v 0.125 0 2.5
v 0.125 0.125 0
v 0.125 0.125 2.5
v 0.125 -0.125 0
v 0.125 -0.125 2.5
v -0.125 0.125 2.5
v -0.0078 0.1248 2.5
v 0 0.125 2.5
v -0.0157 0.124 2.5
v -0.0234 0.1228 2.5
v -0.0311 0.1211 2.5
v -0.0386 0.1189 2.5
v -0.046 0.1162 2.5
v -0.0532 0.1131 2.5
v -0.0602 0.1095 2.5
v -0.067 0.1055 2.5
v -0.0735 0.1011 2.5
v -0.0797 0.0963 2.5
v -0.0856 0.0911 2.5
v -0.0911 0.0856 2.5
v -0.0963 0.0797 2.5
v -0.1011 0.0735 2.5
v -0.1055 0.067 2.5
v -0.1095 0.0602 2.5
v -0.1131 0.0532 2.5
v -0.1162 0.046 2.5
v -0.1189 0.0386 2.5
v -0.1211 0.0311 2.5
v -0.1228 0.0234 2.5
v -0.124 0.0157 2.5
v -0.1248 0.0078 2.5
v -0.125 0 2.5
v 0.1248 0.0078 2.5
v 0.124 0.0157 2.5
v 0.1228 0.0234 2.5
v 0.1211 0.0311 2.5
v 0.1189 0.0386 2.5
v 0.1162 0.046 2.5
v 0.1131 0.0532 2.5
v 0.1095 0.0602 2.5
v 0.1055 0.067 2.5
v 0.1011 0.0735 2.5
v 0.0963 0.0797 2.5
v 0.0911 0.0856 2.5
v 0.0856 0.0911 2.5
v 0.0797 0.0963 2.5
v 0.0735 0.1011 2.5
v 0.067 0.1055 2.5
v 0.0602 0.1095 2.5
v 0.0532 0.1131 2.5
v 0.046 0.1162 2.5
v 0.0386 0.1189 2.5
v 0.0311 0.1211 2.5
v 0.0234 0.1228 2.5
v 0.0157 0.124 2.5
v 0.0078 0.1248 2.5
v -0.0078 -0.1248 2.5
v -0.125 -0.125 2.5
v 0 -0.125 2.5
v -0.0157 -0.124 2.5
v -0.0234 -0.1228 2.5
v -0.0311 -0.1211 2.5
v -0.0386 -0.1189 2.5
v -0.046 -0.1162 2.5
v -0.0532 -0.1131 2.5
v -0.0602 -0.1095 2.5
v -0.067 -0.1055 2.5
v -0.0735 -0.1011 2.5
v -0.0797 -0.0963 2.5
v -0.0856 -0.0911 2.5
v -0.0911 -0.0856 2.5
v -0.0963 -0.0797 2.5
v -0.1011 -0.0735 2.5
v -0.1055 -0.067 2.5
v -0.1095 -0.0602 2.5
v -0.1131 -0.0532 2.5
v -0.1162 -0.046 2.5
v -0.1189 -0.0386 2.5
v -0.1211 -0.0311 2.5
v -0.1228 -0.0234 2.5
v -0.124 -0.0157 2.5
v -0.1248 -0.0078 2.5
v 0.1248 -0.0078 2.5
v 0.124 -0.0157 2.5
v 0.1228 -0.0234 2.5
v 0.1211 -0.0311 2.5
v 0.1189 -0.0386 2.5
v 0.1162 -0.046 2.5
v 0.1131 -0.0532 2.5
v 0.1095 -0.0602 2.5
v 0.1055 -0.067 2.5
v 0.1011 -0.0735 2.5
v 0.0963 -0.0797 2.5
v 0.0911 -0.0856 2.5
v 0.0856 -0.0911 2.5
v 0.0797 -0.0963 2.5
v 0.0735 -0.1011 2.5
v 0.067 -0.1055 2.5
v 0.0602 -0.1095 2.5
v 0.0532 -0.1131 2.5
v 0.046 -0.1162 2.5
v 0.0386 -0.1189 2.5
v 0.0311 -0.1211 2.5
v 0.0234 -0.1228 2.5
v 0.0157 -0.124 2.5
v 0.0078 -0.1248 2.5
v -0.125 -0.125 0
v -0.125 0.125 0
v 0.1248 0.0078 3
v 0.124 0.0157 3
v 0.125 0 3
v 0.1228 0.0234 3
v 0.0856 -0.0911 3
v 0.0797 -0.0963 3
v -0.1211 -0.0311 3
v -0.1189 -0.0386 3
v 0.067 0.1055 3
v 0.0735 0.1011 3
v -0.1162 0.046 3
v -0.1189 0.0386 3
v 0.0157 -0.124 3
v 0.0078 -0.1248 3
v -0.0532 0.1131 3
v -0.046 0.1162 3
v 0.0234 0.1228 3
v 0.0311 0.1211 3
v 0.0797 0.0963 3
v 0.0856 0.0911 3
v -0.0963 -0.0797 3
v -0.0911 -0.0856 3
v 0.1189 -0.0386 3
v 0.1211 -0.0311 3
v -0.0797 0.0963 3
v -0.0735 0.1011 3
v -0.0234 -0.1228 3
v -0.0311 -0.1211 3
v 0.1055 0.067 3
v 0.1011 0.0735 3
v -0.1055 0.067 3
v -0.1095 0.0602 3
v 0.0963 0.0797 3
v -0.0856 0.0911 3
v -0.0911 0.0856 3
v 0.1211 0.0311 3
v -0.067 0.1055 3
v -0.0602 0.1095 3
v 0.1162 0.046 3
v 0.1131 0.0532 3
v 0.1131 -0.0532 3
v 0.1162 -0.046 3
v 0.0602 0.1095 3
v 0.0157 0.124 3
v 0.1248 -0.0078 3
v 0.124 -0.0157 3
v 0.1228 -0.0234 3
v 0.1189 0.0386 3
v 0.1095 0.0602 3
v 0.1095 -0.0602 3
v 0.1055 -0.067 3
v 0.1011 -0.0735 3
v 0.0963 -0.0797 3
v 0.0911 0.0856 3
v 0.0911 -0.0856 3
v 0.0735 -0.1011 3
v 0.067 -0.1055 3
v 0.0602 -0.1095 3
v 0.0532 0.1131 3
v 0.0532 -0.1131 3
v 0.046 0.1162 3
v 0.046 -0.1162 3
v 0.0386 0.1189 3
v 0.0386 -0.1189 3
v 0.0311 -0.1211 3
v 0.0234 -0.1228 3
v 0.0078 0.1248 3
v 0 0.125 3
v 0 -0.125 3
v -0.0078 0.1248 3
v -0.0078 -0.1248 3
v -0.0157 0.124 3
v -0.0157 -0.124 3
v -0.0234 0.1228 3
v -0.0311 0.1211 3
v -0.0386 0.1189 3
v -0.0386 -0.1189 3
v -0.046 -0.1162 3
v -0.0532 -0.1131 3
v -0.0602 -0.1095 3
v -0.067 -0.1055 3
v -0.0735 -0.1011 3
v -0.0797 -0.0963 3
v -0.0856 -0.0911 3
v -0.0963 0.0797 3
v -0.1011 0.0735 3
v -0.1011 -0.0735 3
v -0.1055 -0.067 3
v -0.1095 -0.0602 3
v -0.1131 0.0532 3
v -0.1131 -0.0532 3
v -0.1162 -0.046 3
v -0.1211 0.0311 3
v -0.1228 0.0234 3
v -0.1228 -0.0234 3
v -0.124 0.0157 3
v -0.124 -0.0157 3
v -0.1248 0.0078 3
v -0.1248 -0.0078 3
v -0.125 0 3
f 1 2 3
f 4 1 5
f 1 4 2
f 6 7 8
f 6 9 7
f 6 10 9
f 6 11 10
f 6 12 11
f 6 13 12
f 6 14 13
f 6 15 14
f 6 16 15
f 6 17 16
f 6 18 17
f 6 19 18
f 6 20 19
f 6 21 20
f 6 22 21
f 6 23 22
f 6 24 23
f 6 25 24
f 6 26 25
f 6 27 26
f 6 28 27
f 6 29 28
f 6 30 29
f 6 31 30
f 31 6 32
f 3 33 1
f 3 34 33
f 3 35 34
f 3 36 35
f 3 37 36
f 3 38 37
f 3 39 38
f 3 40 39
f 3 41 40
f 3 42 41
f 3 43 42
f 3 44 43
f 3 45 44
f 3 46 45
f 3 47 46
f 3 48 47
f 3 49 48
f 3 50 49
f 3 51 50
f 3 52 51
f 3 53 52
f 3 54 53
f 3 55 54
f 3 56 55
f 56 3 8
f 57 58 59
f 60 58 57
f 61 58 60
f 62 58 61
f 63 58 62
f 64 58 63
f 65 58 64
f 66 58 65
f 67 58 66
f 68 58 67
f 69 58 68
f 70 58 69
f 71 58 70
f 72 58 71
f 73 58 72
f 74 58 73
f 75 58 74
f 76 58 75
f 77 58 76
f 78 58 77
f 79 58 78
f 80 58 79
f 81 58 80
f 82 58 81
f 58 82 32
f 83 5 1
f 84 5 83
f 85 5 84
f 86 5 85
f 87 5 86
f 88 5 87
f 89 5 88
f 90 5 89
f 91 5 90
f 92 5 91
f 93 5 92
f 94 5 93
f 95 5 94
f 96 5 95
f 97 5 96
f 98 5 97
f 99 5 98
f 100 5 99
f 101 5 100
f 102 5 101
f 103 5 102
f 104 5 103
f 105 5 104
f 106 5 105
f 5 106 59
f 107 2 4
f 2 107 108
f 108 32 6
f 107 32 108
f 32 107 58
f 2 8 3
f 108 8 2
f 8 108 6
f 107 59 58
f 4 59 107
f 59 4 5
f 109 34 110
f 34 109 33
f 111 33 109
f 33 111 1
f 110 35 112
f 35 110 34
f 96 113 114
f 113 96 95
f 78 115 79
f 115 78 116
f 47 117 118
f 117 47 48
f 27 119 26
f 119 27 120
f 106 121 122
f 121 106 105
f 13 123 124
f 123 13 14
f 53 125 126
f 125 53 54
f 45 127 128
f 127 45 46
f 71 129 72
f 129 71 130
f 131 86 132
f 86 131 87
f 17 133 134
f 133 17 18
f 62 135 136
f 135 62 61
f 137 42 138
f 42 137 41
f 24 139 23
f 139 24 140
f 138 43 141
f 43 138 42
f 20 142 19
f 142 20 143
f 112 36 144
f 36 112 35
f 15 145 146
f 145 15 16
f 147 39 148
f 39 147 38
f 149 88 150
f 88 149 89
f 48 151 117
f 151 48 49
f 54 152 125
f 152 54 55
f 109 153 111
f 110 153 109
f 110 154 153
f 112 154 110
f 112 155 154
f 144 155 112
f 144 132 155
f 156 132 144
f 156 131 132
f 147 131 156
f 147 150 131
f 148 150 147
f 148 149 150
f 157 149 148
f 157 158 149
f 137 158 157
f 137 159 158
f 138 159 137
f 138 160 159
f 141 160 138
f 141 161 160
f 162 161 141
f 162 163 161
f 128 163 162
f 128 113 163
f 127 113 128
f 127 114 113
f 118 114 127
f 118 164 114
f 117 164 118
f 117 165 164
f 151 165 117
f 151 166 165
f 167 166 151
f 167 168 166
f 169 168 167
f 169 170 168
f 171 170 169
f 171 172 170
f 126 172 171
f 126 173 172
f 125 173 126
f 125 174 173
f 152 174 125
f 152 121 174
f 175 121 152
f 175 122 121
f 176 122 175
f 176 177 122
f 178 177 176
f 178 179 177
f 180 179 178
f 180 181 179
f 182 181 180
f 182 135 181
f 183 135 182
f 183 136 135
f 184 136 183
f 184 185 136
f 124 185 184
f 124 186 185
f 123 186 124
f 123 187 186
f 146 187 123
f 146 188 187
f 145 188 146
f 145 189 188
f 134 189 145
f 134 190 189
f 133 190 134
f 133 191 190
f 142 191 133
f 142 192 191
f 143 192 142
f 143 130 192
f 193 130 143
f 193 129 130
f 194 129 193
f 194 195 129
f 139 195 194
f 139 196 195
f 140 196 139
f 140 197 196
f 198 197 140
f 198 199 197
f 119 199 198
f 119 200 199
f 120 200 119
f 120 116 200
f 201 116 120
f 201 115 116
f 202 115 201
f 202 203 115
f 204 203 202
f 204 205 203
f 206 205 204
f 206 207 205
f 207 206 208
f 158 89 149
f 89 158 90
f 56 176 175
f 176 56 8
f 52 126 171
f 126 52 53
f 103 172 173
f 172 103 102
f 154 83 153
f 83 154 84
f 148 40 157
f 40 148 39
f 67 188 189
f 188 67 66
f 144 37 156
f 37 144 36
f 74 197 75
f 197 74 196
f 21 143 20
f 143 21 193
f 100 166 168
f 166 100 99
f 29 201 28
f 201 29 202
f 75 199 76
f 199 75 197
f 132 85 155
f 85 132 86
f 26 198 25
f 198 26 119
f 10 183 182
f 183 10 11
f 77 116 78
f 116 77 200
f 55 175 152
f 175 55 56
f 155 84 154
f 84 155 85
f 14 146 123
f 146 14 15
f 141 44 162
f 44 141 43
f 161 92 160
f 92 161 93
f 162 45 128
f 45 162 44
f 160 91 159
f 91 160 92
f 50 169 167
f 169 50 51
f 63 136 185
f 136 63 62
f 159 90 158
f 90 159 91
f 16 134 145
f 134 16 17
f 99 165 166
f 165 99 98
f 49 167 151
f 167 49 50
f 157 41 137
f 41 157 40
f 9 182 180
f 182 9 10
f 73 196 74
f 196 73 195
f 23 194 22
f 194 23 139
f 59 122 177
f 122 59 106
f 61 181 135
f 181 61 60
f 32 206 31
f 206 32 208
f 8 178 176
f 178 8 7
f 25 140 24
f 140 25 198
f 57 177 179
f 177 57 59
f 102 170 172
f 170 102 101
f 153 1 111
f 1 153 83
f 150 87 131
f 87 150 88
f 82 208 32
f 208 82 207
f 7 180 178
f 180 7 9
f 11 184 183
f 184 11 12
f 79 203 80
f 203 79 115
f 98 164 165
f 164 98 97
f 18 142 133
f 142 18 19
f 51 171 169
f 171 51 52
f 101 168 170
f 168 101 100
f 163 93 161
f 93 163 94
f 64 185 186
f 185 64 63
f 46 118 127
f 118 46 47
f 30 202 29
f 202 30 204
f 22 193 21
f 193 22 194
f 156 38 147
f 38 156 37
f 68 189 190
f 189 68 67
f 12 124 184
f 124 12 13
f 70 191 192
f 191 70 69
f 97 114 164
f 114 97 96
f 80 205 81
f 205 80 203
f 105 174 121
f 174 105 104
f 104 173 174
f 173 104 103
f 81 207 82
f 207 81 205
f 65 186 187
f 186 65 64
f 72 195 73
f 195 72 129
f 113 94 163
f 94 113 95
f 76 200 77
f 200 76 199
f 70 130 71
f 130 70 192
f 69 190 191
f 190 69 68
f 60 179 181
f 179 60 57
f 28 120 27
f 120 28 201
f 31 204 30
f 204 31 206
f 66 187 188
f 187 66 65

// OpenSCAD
//########################################################
// rounded post.scad - square post with rounded top
// (c) 2021 - Roie R. Black
//========================================================
$fn=100;

module rounded_post(z1=3, z2=2.5, t = 0.25) {
  union() {
      translate([-t/2,-t/2,0])
      cube([t,t,z2]);
      translate([0,0,z2])
      cylinder(r=t/2, h=z1-z2);
  }
}

rounded_post();
